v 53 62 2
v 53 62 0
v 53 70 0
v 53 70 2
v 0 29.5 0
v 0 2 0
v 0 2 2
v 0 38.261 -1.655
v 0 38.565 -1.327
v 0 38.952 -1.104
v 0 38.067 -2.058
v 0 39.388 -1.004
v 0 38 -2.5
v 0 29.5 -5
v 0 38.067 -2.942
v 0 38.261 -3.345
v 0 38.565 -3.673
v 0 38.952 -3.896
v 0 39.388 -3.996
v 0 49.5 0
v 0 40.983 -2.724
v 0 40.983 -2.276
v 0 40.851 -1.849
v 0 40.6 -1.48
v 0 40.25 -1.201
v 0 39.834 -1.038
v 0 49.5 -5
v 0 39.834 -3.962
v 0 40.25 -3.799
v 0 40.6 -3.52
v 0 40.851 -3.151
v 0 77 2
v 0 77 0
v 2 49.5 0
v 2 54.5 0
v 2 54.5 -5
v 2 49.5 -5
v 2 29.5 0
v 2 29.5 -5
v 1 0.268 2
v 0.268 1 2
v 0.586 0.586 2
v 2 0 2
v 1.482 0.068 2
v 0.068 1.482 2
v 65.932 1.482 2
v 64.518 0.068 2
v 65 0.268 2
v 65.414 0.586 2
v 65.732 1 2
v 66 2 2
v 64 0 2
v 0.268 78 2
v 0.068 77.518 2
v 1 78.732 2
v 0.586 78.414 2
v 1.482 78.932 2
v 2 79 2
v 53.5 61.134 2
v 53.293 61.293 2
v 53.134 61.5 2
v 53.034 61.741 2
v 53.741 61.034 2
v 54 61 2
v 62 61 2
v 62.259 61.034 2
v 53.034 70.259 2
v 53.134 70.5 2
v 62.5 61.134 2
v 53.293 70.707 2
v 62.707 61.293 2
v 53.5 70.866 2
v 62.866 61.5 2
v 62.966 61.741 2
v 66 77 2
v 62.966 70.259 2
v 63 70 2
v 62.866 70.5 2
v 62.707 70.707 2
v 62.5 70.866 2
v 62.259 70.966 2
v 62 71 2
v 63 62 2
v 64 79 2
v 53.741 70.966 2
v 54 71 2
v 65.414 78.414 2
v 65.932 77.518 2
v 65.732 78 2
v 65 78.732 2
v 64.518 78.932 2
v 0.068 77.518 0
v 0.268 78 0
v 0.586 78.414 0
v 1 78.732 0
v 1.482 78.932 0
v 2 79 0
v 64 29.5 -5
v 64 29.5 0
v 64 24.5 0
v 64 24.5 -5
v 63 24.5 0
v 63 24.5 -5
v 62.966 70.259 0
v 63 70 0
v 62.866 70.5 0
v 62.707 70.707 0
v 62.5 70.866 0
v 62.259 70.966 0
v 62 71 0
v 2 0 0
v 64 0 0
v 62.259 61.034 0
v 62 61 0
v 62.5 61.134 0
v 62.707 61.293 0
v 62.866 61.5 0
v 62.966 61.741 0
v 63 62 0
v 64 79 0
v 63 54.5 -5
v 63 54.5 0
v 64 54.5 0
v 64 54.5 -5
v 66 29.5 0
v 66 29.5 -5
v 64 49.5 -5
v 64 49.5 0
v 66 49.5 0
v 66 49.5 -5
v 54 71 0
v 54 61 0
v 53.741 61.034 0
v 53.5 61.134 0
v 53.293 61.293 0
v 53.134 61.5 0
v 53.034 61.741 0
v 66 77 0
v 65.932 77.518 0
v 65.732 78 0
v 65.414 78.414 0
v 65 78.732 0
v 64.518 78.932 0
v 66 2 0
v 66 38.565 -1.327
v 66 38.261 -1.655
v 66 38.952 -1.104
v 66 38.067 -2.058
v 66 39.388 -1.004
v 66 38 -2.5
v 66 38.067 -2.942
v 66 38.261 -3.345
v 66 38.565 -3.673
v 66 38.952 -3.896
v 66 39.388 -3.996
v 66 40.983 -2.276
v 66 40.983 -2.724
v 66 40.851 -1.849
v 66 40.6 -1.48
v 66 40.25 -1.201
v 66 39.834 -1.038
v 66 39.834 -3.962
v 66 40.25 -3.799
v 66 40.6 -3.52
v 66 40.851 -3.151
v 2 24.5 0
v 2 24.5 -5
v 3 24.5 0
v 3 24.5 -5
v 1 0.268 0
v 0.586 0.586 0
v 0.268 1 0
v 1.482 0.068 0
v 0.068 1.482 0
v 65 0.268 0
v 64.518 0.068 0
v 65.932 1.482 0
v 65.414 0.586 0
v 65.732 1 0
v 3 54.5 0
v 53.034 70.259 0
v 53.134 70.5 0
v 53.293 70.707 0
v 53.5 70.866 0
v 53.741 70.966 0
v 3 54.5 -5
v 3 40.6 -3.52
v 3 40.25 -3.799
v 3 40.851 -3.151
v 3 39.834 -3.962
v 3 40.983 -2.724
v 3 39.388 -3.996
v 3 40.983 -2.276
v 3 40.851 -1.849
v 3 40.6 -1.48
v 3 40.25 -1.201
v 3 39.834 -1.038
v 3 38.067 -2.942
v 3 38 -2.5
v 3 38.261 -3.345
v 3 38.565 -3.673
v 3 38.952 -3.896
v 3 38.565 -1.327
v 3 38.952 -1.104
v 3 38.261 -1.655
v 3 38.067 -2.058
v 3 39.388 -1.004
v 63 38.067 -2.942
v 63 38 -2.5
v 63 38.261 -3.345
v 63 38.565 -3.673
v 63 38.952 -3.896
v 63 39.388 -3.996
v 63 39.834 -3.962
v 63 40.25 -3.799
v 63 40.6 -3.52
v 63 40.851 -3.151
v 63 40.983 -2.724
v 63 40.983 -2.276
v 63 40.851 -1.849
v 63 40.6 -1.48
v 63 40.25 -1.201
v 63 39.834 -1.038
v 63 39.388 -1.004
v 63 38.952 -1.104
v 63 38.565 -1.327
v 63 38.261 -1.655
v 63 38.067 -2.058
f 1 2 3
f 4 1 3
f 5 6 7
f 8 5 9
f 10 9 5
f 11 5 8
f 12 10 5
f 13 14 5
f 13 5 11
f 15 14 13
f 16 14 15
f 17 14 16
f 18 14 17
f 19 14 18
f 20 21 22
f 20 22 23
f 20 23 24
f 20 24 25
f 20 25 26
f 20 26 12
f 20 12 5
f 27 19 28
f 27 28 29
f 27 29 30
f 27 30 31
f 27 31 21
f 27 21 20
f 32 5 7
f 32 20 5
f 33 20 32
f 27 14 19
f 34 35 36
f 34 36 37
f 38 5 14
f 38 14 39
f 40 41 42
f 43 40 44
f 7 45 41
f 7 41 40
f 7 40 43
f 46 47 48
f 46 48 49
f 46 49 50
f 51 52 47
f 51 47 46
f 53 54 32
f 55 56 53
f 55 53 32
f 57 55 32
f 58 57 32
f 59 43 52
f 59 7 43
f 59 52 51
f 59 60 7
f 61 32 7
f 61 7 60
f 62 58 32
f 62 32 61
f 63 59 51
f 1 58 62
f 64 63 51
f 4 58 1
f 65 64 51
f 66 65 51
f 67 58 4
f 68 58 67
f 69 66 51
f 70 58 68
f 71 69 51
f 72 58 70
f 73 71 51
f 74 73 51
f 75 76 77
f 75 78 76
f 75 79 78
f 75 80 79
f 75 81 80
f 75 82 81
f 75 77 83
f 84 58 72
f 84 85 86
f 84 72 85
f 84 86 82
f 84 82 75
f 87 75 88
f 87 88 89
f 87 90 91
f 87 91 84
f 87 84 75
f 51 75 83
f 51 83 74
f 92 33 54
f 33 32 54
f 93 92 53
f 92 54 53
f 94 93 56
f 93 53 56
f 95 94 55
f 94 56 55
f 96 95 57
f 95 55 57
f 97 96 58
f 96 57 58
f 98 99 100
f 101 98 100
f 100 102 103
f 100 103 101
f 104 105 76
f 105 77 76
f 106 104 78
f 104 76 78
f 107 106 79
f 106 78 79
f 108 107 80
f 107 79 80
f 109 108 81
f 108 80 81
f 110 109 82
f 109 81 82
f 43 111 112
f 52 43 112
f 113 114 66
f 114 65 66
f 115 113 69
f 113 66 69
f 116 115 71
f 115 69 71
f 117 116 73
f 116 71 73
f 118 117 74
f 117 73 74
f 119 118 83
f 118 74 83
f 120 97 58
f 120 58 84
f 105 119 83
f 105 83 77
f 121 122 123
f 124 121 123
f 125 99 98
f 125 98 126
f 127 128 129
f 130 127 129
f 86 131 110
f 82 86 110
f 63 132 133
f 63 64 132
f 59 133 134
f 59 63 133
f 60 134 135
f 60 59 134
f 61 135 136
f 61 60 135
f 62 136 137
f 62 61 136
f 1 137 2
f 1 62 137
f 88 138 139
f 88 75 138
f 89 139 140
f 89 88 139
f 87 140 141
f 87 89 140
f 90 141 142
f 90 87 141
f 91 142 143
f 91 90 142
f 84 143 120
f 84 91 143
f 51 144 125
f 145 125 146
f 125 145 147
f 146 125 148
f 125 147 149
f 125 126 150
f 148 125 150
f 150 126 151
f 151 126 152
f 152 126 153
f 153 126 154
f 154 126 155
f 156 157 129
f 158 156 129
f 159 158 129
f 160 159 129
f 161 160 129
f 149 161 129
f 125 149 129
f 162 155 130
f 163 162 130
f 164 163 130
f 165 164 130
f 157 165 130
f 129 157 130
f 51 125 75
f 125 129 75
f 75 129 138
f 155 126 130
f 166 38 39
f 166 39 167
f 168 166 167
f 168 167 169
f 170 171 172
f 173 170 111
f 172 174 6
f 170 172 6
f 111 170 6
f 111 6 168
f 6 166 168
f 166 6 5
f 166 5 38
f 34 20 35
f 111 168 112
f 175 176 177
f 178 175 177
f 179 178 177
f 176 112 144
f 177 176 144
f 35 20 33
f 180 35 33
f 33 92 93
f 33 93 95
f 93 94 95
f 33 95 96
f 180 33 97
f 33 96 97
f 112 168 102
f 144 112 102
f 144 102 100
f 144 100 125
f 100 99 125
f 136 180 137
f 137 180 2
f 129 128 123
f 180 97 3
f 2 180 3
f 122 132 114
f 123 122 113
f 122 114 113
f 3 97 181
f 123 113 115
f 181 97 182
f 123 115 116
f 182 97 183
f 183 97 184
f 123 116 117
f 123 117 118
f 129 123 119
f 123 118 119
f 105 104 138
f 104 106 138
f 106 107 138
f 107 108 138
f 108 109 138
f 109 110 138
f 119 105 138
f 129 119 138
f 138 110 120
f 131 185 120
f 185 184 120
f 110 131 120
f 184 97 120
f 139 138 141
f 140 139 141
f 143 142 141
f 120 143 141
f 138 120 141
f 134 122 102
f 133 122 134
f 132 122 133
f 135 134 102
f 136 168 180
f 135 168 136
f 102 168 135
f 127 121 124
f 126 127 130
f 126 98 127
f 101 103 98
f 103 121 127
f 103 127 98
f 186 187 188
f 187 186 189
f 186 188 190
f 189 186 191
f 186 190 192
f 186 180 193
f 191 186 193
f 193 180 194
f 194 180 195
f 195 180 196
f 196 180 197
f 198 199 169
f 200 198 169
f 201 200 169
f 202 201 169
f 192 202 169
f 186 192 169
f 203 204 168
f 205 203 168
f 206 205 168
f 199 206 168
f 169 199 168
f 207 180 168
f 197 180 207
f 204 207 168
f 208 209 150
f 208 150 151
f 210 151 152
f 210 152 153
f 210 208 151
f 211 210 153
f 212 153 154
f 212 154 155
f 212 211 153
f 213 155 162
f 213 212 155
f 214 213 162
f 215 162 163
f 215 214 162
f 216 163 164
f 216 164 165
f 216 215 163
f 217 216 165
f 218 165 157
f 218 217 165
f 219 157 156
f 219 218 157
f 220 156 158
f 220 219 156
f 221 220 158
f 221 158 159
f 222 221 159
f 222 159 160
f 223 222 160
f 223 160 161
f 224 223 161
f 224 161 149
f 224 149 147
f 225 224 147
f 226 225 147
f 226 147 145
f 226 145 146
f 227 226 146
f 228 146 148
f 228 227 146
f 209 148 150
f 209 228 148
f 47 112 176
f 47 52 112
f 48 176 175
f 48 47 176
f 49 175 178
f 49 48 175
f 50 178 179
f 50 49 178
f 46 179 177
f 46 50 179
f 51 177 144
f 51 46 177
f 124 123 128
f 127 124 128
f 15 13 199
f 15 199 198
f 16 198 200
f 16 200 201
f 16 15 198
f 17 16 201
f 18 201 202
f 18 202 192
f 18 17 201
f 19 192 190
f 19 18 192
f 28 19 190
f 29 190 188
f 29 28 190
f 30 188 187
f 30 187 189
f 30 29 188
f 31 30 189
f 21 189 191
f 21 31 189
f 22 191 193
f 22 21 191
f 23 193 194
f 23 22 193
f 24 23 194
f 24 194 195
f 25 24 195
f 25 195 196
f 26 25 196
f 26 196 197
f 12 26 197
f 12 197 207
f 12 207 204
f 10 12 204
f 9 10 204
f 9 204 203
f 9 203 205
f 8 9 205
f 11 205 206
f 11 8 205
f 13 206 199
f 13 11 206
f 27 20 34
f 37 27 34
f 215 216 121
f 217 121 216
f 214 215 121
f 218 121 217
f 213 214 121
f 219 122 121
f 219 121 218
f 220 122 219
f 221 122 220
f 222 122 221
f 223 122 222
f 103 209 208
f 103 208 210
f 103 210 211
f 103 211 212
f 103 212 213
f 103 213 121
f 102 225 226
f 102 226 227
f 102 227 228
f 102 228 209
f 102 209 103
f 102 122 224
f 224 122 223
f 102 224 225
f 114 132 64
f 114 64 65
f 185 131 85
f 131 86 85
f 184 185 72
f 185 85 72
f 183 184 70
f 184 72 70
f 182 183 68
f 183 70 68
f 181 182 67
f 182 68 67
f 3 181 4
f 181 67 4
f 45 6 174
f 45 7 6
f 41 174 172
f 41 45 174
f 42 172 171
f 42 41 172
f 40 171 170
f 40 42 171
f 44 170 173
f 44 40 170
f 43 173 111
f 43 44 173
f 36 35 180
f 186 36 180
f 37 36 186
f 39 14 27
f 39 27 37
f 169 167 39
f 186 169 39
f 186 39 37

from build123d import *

# Parameters (mm, degrees)
BOX_W                  = 66
BOX_H                  = 79
BOX_DEPTH              = 2
FILLET_R               = 2
BOX001_W               = 10
BOX001_H               = 10
BOX001_DEPTH           = 2
FILLET001_R            = 1
BOX002_W               = 2
BOX002_H               = 20
BOX002_DEPTH           = 5
LINEARPATTERN_COUNT    = 2
LINEARPATTERN_PITCH    = 64
BOX003_W               = 1
BOX003_H               = 30
BOX003_DEPTH           = 5
LINEARPATTERN001_COUNT = 2
LINEARPATTERN001_PITCH = 61
CYLINDER_R             = 1.5
CYLINDER_DEPTH         = 3
LINEARPATTERN002_COUNT = 2
LINEARPATTERN002_PITCH = 63


with BuildPart() as part:
    # Box → Box (join)
    with BuildSketch(Plane.XY):
        with Locations((33, 39.5)):
            Rectangle(BOX_W, BOX_H)
    extrude(amount=BOX_DEPTH)

    # Fillet
    fillet_edges = [part.edges().sort_by_distance(p)[0] for p in [
        (0, 0, 1),
        (66, 0, 1),
        (66, 79, 1),
        (0, 79, 1),
    ]]
    fillet(fillet_edges, radius=FILLET_R)

    # Box001 → Box001 (cut)
    with BuildSketch(Plane(origin=(53, 61, 0), x_dir=(1, 0, 0), z_dir=(0, 0, 1))):
        with Locations((5, 5)):
            Rectangle(BOX001_W, BOX001_H)
    extrude(amount=BOX001_DEPTH, mode=Mode.SUBTRACT)

    # Fillet001
    fillet001_edges = [part.edges().sort_by_distance(p)[0] for p in [
        (53, 71, 1),
        (63, 71, 1),
        (53, 61, 1),
        (63, 61, 1),
    ]]
    fillet(fillet001_edges, radius=FILLET001_R)

    # Box002 → Box002 (join)
    with BuildSketch(Plane(origin=(64, 49.5, 0), x_dir=(1, 0, 0), z_dir=(0, 0, -1))):
        with Locations((1, 10)):
            Rectangle(BOX002_W, BOX002_H)
    box002 = extrude(amount=BOX002_DEPTH)

    # LinearPattern: Box002 ×2
    with Locations(*[(-i * LINEARPATTERN_PITCH, 0, 0) for i in range(1, LINEARPATTERN_COUNT)]):
        add(box002)

    # Box003 → Box003 (join)
    with BuildSketch(Plane(origin=(63, 54.5, 0), x_dir=(1, 0, 0), z_dir=(0, 0, -1))):
        with Locations((0.5, 15)):
            Rectangle(BOX003_W, BOX003_H)
    box003 = extrude(amount=BOX003_DEPTH)

    # LinearPattern001: Box003 ×2
    with Locations(*[(-i * LINEARPATTERN001_PITCH, 0, 0) for i in range(1, LINEARPATTERN001_COUNT)]):
        add(box003)

    # Cylinder → Cylinder (cut)
    with BuildSketch(Plane(origin=(63, 39.5, -2.5), x_dir=(0, -1, 0), z_dir=(1, 0, 0))):
        Circle(CYLINDER_R)
    cylinder = extrude(amount=CYLINDER_DEPTH, mode=Mode.SUBTRACT)

    # LinearPattern002: Cylinder ×2
    with Locations(*[(-i * LINEARPATTERN002_PITCH, 0, 0) for i in range(1, LINEARPATTERN002_COUNT)]):
        add(cylinder, mode=Mode.SUBTRACT)


solid = part.part
